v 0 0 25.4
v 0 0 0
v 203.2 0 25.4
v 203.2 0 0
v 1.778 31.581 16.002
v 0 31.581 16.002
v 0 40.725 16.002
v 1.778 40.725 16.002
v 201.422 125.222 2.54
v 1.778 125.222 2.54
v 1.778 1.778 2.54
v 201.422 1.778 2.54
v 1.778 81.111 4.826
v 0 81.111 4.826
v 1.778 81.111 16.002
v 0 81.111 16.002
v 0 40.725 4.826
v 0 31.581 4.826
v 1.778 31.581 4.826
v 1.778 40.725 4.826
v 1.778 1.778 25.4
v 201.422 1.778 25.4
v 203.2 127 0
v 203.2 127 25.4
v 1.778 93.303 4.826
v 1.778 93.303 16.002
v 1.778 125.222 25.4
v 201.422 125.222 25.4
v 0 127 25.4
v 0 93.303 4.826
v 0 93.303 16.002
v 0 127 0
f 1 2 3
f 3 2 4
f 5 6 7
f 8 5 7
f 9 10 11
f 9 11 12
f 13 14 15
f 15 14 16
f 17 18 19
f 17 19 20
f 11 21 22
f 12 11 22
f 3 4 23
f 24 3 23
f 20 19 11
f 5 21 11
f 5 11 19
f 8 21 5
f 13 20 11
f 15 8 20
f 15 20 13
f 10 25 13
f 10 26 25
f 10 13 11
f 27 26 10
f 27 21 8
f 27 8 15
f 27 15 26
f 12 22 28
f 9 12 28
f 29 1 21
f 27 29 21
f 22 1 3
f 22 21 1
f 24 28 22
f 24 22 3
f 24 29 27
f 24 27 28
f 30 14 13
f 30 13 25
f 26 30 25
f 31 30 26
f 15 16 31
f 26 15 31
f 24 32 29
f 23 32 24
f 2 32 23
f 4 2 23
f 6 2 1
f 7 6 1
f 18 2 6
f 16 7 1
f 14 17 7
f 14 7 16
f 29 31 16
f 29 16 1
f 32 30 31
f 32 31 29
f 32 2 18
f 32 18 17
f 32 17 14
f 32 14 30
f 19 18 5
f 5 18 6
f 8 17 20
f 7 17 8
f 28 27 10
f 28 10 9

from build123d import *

# Parameters (mm, degrees)
SKETCH1_W           = 203.2
SKETCH1_H           = 127
BOSS_EXTRUDE1_DEPTH = 25.4
SKETCH2_W           = 199.644
SKETCH2_H           = 123.444
CUT_EXTRUDE1_DEPTH  = 22.86
SKETCH4_W           = 11.176
SKETCH4_H           = 12.192
SKETCH4_H_2         = 9.144
CUT_EXTRUDE2_DEPTH  = 1.778


with BuildPart() as part:
    # Sketch1 → Boss-Extrude1 (new body)
    with BuildSketch(Plane.XY):
        with Locations((101.6, 63.5)):
            Rectangle(SKETCH1_W, SKETCH1_H)
    extrude(amount=BOSS_EXTRUDE1_DEPTH)

    # Sketch2 → Cut-Extrude1 (cut)
    with BuildSketch(Plane.XY.offset(25.4)):
        with Locations((101.6, 63.5)):
            Rectangle(SKETCH2_W, SKETCH2_H)
    extrude(amount=-CUT_EXTRUDE1_DEPTH, mode=Mode.SUBTRACT)

    # Sketch4 → Cut-Extrude2 (cut)
    with BuildSketch(Plane.ZY):
        with Locations((10.414, 87.206902012)):
            Rectangle(SKETCH4_W, SKETCH4_H)
        with Locations((10.414, 36.152902012)):
            Rectangle(SKETCH4_W, SKETCH4_H_2)
    extrude(amount=-CUT_EXTRUDE2_DEPTH, mode=Mode.SUBTRACT)


solid = part.part
